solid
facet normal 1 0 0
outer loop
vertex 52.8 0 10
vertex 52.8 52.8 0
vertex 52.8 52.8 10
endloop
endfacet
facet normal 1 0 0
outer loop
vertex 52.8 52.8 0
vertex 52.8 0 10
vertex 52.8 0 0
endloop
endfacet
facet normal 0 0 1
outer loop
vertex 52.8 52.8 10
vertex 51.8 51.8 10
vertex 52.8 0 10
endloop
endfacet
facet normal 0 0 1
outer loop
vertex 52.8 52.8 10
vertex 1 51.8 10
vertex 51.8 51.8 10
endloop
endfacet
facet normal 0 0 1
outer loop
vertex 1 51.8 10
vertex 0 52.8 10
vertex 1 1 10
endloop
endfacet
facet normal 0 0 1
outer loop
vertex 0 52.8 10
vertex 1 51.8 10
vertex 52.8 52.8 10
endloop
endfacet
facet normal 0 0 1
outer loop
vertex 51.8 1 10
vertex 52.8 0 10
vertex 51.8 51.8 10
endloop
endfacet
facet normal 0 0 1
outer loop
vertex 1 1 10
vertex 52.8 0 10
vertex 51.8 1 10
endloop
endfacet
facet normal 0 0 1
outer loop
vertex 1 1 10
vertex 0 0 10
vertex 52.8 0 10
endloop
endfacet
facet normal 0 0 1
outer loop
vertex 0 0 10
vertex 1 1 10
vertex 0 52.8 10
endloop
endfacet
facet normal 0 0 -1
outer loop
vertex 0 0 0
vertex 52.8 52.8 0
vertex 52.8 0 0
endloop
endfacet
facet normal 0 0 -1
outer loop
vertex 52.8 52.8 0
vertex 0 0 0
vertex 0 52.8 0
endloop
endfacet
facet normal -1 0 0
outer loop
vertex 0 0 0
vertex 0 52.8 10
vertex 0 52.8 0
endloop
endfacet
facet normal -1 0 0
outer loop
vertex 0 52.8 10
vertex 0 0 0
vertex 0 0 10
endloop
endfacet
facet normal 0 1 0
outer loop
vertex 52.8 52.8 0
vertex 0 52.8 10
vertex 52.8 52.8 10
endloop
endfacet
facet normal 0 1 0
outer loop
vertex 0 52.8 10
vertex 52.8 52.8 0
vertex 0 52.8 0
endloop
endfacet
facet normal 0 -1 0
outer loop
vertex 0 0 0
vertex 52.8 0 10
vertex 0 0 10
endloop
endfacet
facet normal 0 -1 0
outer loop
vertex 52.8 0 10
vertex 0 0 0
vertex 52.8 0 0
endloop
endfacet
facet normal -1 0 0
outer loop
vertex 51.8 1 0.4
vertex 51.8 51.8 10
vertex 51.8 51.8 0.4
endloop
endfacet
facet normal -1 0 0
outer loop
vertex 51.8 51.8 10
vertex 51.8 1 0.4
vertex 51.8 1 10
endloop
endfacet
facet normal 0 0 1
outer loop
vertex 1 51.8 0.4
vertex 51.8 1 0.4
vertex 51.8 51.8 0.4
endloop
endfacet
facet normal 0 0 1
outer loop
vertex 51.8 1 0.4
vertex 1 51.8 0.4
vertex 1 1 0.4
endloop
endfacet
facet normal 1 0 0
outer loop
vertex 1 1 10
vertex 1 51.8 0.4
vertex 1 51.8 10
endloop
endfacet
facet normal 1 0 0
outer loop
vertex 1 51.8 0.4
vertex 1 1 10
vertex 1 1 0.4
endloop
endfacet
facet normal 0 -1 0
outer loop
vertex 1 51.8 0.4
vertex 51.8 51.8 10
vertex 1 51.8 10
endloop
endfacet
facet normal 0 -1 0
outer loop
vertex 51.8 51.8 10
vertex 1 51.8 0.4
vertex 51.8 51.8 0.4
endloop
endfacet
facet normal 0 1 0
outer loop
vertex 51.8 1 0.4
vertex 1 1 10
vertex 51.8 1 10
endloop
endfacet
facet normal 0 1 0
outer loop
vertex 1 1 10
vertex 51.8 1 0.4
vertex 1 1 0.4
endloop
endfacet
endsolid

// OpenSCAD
// (mm)
inner_width = 50.8;
// (mm)
inner_length = 50.8;
// (mm)
height = 10;
// (mm)
floor_thickness = 0.4;
// (mm)
wall_thickness = 1;

difference(){
    cube([inner_length+(2*wall_thickness),inner_width+(2*wall_thickness),height]);
    translate([wall_thickness,wall_thickness,floor_thickness]) cube([inner_length,inner_width,height]);
}
